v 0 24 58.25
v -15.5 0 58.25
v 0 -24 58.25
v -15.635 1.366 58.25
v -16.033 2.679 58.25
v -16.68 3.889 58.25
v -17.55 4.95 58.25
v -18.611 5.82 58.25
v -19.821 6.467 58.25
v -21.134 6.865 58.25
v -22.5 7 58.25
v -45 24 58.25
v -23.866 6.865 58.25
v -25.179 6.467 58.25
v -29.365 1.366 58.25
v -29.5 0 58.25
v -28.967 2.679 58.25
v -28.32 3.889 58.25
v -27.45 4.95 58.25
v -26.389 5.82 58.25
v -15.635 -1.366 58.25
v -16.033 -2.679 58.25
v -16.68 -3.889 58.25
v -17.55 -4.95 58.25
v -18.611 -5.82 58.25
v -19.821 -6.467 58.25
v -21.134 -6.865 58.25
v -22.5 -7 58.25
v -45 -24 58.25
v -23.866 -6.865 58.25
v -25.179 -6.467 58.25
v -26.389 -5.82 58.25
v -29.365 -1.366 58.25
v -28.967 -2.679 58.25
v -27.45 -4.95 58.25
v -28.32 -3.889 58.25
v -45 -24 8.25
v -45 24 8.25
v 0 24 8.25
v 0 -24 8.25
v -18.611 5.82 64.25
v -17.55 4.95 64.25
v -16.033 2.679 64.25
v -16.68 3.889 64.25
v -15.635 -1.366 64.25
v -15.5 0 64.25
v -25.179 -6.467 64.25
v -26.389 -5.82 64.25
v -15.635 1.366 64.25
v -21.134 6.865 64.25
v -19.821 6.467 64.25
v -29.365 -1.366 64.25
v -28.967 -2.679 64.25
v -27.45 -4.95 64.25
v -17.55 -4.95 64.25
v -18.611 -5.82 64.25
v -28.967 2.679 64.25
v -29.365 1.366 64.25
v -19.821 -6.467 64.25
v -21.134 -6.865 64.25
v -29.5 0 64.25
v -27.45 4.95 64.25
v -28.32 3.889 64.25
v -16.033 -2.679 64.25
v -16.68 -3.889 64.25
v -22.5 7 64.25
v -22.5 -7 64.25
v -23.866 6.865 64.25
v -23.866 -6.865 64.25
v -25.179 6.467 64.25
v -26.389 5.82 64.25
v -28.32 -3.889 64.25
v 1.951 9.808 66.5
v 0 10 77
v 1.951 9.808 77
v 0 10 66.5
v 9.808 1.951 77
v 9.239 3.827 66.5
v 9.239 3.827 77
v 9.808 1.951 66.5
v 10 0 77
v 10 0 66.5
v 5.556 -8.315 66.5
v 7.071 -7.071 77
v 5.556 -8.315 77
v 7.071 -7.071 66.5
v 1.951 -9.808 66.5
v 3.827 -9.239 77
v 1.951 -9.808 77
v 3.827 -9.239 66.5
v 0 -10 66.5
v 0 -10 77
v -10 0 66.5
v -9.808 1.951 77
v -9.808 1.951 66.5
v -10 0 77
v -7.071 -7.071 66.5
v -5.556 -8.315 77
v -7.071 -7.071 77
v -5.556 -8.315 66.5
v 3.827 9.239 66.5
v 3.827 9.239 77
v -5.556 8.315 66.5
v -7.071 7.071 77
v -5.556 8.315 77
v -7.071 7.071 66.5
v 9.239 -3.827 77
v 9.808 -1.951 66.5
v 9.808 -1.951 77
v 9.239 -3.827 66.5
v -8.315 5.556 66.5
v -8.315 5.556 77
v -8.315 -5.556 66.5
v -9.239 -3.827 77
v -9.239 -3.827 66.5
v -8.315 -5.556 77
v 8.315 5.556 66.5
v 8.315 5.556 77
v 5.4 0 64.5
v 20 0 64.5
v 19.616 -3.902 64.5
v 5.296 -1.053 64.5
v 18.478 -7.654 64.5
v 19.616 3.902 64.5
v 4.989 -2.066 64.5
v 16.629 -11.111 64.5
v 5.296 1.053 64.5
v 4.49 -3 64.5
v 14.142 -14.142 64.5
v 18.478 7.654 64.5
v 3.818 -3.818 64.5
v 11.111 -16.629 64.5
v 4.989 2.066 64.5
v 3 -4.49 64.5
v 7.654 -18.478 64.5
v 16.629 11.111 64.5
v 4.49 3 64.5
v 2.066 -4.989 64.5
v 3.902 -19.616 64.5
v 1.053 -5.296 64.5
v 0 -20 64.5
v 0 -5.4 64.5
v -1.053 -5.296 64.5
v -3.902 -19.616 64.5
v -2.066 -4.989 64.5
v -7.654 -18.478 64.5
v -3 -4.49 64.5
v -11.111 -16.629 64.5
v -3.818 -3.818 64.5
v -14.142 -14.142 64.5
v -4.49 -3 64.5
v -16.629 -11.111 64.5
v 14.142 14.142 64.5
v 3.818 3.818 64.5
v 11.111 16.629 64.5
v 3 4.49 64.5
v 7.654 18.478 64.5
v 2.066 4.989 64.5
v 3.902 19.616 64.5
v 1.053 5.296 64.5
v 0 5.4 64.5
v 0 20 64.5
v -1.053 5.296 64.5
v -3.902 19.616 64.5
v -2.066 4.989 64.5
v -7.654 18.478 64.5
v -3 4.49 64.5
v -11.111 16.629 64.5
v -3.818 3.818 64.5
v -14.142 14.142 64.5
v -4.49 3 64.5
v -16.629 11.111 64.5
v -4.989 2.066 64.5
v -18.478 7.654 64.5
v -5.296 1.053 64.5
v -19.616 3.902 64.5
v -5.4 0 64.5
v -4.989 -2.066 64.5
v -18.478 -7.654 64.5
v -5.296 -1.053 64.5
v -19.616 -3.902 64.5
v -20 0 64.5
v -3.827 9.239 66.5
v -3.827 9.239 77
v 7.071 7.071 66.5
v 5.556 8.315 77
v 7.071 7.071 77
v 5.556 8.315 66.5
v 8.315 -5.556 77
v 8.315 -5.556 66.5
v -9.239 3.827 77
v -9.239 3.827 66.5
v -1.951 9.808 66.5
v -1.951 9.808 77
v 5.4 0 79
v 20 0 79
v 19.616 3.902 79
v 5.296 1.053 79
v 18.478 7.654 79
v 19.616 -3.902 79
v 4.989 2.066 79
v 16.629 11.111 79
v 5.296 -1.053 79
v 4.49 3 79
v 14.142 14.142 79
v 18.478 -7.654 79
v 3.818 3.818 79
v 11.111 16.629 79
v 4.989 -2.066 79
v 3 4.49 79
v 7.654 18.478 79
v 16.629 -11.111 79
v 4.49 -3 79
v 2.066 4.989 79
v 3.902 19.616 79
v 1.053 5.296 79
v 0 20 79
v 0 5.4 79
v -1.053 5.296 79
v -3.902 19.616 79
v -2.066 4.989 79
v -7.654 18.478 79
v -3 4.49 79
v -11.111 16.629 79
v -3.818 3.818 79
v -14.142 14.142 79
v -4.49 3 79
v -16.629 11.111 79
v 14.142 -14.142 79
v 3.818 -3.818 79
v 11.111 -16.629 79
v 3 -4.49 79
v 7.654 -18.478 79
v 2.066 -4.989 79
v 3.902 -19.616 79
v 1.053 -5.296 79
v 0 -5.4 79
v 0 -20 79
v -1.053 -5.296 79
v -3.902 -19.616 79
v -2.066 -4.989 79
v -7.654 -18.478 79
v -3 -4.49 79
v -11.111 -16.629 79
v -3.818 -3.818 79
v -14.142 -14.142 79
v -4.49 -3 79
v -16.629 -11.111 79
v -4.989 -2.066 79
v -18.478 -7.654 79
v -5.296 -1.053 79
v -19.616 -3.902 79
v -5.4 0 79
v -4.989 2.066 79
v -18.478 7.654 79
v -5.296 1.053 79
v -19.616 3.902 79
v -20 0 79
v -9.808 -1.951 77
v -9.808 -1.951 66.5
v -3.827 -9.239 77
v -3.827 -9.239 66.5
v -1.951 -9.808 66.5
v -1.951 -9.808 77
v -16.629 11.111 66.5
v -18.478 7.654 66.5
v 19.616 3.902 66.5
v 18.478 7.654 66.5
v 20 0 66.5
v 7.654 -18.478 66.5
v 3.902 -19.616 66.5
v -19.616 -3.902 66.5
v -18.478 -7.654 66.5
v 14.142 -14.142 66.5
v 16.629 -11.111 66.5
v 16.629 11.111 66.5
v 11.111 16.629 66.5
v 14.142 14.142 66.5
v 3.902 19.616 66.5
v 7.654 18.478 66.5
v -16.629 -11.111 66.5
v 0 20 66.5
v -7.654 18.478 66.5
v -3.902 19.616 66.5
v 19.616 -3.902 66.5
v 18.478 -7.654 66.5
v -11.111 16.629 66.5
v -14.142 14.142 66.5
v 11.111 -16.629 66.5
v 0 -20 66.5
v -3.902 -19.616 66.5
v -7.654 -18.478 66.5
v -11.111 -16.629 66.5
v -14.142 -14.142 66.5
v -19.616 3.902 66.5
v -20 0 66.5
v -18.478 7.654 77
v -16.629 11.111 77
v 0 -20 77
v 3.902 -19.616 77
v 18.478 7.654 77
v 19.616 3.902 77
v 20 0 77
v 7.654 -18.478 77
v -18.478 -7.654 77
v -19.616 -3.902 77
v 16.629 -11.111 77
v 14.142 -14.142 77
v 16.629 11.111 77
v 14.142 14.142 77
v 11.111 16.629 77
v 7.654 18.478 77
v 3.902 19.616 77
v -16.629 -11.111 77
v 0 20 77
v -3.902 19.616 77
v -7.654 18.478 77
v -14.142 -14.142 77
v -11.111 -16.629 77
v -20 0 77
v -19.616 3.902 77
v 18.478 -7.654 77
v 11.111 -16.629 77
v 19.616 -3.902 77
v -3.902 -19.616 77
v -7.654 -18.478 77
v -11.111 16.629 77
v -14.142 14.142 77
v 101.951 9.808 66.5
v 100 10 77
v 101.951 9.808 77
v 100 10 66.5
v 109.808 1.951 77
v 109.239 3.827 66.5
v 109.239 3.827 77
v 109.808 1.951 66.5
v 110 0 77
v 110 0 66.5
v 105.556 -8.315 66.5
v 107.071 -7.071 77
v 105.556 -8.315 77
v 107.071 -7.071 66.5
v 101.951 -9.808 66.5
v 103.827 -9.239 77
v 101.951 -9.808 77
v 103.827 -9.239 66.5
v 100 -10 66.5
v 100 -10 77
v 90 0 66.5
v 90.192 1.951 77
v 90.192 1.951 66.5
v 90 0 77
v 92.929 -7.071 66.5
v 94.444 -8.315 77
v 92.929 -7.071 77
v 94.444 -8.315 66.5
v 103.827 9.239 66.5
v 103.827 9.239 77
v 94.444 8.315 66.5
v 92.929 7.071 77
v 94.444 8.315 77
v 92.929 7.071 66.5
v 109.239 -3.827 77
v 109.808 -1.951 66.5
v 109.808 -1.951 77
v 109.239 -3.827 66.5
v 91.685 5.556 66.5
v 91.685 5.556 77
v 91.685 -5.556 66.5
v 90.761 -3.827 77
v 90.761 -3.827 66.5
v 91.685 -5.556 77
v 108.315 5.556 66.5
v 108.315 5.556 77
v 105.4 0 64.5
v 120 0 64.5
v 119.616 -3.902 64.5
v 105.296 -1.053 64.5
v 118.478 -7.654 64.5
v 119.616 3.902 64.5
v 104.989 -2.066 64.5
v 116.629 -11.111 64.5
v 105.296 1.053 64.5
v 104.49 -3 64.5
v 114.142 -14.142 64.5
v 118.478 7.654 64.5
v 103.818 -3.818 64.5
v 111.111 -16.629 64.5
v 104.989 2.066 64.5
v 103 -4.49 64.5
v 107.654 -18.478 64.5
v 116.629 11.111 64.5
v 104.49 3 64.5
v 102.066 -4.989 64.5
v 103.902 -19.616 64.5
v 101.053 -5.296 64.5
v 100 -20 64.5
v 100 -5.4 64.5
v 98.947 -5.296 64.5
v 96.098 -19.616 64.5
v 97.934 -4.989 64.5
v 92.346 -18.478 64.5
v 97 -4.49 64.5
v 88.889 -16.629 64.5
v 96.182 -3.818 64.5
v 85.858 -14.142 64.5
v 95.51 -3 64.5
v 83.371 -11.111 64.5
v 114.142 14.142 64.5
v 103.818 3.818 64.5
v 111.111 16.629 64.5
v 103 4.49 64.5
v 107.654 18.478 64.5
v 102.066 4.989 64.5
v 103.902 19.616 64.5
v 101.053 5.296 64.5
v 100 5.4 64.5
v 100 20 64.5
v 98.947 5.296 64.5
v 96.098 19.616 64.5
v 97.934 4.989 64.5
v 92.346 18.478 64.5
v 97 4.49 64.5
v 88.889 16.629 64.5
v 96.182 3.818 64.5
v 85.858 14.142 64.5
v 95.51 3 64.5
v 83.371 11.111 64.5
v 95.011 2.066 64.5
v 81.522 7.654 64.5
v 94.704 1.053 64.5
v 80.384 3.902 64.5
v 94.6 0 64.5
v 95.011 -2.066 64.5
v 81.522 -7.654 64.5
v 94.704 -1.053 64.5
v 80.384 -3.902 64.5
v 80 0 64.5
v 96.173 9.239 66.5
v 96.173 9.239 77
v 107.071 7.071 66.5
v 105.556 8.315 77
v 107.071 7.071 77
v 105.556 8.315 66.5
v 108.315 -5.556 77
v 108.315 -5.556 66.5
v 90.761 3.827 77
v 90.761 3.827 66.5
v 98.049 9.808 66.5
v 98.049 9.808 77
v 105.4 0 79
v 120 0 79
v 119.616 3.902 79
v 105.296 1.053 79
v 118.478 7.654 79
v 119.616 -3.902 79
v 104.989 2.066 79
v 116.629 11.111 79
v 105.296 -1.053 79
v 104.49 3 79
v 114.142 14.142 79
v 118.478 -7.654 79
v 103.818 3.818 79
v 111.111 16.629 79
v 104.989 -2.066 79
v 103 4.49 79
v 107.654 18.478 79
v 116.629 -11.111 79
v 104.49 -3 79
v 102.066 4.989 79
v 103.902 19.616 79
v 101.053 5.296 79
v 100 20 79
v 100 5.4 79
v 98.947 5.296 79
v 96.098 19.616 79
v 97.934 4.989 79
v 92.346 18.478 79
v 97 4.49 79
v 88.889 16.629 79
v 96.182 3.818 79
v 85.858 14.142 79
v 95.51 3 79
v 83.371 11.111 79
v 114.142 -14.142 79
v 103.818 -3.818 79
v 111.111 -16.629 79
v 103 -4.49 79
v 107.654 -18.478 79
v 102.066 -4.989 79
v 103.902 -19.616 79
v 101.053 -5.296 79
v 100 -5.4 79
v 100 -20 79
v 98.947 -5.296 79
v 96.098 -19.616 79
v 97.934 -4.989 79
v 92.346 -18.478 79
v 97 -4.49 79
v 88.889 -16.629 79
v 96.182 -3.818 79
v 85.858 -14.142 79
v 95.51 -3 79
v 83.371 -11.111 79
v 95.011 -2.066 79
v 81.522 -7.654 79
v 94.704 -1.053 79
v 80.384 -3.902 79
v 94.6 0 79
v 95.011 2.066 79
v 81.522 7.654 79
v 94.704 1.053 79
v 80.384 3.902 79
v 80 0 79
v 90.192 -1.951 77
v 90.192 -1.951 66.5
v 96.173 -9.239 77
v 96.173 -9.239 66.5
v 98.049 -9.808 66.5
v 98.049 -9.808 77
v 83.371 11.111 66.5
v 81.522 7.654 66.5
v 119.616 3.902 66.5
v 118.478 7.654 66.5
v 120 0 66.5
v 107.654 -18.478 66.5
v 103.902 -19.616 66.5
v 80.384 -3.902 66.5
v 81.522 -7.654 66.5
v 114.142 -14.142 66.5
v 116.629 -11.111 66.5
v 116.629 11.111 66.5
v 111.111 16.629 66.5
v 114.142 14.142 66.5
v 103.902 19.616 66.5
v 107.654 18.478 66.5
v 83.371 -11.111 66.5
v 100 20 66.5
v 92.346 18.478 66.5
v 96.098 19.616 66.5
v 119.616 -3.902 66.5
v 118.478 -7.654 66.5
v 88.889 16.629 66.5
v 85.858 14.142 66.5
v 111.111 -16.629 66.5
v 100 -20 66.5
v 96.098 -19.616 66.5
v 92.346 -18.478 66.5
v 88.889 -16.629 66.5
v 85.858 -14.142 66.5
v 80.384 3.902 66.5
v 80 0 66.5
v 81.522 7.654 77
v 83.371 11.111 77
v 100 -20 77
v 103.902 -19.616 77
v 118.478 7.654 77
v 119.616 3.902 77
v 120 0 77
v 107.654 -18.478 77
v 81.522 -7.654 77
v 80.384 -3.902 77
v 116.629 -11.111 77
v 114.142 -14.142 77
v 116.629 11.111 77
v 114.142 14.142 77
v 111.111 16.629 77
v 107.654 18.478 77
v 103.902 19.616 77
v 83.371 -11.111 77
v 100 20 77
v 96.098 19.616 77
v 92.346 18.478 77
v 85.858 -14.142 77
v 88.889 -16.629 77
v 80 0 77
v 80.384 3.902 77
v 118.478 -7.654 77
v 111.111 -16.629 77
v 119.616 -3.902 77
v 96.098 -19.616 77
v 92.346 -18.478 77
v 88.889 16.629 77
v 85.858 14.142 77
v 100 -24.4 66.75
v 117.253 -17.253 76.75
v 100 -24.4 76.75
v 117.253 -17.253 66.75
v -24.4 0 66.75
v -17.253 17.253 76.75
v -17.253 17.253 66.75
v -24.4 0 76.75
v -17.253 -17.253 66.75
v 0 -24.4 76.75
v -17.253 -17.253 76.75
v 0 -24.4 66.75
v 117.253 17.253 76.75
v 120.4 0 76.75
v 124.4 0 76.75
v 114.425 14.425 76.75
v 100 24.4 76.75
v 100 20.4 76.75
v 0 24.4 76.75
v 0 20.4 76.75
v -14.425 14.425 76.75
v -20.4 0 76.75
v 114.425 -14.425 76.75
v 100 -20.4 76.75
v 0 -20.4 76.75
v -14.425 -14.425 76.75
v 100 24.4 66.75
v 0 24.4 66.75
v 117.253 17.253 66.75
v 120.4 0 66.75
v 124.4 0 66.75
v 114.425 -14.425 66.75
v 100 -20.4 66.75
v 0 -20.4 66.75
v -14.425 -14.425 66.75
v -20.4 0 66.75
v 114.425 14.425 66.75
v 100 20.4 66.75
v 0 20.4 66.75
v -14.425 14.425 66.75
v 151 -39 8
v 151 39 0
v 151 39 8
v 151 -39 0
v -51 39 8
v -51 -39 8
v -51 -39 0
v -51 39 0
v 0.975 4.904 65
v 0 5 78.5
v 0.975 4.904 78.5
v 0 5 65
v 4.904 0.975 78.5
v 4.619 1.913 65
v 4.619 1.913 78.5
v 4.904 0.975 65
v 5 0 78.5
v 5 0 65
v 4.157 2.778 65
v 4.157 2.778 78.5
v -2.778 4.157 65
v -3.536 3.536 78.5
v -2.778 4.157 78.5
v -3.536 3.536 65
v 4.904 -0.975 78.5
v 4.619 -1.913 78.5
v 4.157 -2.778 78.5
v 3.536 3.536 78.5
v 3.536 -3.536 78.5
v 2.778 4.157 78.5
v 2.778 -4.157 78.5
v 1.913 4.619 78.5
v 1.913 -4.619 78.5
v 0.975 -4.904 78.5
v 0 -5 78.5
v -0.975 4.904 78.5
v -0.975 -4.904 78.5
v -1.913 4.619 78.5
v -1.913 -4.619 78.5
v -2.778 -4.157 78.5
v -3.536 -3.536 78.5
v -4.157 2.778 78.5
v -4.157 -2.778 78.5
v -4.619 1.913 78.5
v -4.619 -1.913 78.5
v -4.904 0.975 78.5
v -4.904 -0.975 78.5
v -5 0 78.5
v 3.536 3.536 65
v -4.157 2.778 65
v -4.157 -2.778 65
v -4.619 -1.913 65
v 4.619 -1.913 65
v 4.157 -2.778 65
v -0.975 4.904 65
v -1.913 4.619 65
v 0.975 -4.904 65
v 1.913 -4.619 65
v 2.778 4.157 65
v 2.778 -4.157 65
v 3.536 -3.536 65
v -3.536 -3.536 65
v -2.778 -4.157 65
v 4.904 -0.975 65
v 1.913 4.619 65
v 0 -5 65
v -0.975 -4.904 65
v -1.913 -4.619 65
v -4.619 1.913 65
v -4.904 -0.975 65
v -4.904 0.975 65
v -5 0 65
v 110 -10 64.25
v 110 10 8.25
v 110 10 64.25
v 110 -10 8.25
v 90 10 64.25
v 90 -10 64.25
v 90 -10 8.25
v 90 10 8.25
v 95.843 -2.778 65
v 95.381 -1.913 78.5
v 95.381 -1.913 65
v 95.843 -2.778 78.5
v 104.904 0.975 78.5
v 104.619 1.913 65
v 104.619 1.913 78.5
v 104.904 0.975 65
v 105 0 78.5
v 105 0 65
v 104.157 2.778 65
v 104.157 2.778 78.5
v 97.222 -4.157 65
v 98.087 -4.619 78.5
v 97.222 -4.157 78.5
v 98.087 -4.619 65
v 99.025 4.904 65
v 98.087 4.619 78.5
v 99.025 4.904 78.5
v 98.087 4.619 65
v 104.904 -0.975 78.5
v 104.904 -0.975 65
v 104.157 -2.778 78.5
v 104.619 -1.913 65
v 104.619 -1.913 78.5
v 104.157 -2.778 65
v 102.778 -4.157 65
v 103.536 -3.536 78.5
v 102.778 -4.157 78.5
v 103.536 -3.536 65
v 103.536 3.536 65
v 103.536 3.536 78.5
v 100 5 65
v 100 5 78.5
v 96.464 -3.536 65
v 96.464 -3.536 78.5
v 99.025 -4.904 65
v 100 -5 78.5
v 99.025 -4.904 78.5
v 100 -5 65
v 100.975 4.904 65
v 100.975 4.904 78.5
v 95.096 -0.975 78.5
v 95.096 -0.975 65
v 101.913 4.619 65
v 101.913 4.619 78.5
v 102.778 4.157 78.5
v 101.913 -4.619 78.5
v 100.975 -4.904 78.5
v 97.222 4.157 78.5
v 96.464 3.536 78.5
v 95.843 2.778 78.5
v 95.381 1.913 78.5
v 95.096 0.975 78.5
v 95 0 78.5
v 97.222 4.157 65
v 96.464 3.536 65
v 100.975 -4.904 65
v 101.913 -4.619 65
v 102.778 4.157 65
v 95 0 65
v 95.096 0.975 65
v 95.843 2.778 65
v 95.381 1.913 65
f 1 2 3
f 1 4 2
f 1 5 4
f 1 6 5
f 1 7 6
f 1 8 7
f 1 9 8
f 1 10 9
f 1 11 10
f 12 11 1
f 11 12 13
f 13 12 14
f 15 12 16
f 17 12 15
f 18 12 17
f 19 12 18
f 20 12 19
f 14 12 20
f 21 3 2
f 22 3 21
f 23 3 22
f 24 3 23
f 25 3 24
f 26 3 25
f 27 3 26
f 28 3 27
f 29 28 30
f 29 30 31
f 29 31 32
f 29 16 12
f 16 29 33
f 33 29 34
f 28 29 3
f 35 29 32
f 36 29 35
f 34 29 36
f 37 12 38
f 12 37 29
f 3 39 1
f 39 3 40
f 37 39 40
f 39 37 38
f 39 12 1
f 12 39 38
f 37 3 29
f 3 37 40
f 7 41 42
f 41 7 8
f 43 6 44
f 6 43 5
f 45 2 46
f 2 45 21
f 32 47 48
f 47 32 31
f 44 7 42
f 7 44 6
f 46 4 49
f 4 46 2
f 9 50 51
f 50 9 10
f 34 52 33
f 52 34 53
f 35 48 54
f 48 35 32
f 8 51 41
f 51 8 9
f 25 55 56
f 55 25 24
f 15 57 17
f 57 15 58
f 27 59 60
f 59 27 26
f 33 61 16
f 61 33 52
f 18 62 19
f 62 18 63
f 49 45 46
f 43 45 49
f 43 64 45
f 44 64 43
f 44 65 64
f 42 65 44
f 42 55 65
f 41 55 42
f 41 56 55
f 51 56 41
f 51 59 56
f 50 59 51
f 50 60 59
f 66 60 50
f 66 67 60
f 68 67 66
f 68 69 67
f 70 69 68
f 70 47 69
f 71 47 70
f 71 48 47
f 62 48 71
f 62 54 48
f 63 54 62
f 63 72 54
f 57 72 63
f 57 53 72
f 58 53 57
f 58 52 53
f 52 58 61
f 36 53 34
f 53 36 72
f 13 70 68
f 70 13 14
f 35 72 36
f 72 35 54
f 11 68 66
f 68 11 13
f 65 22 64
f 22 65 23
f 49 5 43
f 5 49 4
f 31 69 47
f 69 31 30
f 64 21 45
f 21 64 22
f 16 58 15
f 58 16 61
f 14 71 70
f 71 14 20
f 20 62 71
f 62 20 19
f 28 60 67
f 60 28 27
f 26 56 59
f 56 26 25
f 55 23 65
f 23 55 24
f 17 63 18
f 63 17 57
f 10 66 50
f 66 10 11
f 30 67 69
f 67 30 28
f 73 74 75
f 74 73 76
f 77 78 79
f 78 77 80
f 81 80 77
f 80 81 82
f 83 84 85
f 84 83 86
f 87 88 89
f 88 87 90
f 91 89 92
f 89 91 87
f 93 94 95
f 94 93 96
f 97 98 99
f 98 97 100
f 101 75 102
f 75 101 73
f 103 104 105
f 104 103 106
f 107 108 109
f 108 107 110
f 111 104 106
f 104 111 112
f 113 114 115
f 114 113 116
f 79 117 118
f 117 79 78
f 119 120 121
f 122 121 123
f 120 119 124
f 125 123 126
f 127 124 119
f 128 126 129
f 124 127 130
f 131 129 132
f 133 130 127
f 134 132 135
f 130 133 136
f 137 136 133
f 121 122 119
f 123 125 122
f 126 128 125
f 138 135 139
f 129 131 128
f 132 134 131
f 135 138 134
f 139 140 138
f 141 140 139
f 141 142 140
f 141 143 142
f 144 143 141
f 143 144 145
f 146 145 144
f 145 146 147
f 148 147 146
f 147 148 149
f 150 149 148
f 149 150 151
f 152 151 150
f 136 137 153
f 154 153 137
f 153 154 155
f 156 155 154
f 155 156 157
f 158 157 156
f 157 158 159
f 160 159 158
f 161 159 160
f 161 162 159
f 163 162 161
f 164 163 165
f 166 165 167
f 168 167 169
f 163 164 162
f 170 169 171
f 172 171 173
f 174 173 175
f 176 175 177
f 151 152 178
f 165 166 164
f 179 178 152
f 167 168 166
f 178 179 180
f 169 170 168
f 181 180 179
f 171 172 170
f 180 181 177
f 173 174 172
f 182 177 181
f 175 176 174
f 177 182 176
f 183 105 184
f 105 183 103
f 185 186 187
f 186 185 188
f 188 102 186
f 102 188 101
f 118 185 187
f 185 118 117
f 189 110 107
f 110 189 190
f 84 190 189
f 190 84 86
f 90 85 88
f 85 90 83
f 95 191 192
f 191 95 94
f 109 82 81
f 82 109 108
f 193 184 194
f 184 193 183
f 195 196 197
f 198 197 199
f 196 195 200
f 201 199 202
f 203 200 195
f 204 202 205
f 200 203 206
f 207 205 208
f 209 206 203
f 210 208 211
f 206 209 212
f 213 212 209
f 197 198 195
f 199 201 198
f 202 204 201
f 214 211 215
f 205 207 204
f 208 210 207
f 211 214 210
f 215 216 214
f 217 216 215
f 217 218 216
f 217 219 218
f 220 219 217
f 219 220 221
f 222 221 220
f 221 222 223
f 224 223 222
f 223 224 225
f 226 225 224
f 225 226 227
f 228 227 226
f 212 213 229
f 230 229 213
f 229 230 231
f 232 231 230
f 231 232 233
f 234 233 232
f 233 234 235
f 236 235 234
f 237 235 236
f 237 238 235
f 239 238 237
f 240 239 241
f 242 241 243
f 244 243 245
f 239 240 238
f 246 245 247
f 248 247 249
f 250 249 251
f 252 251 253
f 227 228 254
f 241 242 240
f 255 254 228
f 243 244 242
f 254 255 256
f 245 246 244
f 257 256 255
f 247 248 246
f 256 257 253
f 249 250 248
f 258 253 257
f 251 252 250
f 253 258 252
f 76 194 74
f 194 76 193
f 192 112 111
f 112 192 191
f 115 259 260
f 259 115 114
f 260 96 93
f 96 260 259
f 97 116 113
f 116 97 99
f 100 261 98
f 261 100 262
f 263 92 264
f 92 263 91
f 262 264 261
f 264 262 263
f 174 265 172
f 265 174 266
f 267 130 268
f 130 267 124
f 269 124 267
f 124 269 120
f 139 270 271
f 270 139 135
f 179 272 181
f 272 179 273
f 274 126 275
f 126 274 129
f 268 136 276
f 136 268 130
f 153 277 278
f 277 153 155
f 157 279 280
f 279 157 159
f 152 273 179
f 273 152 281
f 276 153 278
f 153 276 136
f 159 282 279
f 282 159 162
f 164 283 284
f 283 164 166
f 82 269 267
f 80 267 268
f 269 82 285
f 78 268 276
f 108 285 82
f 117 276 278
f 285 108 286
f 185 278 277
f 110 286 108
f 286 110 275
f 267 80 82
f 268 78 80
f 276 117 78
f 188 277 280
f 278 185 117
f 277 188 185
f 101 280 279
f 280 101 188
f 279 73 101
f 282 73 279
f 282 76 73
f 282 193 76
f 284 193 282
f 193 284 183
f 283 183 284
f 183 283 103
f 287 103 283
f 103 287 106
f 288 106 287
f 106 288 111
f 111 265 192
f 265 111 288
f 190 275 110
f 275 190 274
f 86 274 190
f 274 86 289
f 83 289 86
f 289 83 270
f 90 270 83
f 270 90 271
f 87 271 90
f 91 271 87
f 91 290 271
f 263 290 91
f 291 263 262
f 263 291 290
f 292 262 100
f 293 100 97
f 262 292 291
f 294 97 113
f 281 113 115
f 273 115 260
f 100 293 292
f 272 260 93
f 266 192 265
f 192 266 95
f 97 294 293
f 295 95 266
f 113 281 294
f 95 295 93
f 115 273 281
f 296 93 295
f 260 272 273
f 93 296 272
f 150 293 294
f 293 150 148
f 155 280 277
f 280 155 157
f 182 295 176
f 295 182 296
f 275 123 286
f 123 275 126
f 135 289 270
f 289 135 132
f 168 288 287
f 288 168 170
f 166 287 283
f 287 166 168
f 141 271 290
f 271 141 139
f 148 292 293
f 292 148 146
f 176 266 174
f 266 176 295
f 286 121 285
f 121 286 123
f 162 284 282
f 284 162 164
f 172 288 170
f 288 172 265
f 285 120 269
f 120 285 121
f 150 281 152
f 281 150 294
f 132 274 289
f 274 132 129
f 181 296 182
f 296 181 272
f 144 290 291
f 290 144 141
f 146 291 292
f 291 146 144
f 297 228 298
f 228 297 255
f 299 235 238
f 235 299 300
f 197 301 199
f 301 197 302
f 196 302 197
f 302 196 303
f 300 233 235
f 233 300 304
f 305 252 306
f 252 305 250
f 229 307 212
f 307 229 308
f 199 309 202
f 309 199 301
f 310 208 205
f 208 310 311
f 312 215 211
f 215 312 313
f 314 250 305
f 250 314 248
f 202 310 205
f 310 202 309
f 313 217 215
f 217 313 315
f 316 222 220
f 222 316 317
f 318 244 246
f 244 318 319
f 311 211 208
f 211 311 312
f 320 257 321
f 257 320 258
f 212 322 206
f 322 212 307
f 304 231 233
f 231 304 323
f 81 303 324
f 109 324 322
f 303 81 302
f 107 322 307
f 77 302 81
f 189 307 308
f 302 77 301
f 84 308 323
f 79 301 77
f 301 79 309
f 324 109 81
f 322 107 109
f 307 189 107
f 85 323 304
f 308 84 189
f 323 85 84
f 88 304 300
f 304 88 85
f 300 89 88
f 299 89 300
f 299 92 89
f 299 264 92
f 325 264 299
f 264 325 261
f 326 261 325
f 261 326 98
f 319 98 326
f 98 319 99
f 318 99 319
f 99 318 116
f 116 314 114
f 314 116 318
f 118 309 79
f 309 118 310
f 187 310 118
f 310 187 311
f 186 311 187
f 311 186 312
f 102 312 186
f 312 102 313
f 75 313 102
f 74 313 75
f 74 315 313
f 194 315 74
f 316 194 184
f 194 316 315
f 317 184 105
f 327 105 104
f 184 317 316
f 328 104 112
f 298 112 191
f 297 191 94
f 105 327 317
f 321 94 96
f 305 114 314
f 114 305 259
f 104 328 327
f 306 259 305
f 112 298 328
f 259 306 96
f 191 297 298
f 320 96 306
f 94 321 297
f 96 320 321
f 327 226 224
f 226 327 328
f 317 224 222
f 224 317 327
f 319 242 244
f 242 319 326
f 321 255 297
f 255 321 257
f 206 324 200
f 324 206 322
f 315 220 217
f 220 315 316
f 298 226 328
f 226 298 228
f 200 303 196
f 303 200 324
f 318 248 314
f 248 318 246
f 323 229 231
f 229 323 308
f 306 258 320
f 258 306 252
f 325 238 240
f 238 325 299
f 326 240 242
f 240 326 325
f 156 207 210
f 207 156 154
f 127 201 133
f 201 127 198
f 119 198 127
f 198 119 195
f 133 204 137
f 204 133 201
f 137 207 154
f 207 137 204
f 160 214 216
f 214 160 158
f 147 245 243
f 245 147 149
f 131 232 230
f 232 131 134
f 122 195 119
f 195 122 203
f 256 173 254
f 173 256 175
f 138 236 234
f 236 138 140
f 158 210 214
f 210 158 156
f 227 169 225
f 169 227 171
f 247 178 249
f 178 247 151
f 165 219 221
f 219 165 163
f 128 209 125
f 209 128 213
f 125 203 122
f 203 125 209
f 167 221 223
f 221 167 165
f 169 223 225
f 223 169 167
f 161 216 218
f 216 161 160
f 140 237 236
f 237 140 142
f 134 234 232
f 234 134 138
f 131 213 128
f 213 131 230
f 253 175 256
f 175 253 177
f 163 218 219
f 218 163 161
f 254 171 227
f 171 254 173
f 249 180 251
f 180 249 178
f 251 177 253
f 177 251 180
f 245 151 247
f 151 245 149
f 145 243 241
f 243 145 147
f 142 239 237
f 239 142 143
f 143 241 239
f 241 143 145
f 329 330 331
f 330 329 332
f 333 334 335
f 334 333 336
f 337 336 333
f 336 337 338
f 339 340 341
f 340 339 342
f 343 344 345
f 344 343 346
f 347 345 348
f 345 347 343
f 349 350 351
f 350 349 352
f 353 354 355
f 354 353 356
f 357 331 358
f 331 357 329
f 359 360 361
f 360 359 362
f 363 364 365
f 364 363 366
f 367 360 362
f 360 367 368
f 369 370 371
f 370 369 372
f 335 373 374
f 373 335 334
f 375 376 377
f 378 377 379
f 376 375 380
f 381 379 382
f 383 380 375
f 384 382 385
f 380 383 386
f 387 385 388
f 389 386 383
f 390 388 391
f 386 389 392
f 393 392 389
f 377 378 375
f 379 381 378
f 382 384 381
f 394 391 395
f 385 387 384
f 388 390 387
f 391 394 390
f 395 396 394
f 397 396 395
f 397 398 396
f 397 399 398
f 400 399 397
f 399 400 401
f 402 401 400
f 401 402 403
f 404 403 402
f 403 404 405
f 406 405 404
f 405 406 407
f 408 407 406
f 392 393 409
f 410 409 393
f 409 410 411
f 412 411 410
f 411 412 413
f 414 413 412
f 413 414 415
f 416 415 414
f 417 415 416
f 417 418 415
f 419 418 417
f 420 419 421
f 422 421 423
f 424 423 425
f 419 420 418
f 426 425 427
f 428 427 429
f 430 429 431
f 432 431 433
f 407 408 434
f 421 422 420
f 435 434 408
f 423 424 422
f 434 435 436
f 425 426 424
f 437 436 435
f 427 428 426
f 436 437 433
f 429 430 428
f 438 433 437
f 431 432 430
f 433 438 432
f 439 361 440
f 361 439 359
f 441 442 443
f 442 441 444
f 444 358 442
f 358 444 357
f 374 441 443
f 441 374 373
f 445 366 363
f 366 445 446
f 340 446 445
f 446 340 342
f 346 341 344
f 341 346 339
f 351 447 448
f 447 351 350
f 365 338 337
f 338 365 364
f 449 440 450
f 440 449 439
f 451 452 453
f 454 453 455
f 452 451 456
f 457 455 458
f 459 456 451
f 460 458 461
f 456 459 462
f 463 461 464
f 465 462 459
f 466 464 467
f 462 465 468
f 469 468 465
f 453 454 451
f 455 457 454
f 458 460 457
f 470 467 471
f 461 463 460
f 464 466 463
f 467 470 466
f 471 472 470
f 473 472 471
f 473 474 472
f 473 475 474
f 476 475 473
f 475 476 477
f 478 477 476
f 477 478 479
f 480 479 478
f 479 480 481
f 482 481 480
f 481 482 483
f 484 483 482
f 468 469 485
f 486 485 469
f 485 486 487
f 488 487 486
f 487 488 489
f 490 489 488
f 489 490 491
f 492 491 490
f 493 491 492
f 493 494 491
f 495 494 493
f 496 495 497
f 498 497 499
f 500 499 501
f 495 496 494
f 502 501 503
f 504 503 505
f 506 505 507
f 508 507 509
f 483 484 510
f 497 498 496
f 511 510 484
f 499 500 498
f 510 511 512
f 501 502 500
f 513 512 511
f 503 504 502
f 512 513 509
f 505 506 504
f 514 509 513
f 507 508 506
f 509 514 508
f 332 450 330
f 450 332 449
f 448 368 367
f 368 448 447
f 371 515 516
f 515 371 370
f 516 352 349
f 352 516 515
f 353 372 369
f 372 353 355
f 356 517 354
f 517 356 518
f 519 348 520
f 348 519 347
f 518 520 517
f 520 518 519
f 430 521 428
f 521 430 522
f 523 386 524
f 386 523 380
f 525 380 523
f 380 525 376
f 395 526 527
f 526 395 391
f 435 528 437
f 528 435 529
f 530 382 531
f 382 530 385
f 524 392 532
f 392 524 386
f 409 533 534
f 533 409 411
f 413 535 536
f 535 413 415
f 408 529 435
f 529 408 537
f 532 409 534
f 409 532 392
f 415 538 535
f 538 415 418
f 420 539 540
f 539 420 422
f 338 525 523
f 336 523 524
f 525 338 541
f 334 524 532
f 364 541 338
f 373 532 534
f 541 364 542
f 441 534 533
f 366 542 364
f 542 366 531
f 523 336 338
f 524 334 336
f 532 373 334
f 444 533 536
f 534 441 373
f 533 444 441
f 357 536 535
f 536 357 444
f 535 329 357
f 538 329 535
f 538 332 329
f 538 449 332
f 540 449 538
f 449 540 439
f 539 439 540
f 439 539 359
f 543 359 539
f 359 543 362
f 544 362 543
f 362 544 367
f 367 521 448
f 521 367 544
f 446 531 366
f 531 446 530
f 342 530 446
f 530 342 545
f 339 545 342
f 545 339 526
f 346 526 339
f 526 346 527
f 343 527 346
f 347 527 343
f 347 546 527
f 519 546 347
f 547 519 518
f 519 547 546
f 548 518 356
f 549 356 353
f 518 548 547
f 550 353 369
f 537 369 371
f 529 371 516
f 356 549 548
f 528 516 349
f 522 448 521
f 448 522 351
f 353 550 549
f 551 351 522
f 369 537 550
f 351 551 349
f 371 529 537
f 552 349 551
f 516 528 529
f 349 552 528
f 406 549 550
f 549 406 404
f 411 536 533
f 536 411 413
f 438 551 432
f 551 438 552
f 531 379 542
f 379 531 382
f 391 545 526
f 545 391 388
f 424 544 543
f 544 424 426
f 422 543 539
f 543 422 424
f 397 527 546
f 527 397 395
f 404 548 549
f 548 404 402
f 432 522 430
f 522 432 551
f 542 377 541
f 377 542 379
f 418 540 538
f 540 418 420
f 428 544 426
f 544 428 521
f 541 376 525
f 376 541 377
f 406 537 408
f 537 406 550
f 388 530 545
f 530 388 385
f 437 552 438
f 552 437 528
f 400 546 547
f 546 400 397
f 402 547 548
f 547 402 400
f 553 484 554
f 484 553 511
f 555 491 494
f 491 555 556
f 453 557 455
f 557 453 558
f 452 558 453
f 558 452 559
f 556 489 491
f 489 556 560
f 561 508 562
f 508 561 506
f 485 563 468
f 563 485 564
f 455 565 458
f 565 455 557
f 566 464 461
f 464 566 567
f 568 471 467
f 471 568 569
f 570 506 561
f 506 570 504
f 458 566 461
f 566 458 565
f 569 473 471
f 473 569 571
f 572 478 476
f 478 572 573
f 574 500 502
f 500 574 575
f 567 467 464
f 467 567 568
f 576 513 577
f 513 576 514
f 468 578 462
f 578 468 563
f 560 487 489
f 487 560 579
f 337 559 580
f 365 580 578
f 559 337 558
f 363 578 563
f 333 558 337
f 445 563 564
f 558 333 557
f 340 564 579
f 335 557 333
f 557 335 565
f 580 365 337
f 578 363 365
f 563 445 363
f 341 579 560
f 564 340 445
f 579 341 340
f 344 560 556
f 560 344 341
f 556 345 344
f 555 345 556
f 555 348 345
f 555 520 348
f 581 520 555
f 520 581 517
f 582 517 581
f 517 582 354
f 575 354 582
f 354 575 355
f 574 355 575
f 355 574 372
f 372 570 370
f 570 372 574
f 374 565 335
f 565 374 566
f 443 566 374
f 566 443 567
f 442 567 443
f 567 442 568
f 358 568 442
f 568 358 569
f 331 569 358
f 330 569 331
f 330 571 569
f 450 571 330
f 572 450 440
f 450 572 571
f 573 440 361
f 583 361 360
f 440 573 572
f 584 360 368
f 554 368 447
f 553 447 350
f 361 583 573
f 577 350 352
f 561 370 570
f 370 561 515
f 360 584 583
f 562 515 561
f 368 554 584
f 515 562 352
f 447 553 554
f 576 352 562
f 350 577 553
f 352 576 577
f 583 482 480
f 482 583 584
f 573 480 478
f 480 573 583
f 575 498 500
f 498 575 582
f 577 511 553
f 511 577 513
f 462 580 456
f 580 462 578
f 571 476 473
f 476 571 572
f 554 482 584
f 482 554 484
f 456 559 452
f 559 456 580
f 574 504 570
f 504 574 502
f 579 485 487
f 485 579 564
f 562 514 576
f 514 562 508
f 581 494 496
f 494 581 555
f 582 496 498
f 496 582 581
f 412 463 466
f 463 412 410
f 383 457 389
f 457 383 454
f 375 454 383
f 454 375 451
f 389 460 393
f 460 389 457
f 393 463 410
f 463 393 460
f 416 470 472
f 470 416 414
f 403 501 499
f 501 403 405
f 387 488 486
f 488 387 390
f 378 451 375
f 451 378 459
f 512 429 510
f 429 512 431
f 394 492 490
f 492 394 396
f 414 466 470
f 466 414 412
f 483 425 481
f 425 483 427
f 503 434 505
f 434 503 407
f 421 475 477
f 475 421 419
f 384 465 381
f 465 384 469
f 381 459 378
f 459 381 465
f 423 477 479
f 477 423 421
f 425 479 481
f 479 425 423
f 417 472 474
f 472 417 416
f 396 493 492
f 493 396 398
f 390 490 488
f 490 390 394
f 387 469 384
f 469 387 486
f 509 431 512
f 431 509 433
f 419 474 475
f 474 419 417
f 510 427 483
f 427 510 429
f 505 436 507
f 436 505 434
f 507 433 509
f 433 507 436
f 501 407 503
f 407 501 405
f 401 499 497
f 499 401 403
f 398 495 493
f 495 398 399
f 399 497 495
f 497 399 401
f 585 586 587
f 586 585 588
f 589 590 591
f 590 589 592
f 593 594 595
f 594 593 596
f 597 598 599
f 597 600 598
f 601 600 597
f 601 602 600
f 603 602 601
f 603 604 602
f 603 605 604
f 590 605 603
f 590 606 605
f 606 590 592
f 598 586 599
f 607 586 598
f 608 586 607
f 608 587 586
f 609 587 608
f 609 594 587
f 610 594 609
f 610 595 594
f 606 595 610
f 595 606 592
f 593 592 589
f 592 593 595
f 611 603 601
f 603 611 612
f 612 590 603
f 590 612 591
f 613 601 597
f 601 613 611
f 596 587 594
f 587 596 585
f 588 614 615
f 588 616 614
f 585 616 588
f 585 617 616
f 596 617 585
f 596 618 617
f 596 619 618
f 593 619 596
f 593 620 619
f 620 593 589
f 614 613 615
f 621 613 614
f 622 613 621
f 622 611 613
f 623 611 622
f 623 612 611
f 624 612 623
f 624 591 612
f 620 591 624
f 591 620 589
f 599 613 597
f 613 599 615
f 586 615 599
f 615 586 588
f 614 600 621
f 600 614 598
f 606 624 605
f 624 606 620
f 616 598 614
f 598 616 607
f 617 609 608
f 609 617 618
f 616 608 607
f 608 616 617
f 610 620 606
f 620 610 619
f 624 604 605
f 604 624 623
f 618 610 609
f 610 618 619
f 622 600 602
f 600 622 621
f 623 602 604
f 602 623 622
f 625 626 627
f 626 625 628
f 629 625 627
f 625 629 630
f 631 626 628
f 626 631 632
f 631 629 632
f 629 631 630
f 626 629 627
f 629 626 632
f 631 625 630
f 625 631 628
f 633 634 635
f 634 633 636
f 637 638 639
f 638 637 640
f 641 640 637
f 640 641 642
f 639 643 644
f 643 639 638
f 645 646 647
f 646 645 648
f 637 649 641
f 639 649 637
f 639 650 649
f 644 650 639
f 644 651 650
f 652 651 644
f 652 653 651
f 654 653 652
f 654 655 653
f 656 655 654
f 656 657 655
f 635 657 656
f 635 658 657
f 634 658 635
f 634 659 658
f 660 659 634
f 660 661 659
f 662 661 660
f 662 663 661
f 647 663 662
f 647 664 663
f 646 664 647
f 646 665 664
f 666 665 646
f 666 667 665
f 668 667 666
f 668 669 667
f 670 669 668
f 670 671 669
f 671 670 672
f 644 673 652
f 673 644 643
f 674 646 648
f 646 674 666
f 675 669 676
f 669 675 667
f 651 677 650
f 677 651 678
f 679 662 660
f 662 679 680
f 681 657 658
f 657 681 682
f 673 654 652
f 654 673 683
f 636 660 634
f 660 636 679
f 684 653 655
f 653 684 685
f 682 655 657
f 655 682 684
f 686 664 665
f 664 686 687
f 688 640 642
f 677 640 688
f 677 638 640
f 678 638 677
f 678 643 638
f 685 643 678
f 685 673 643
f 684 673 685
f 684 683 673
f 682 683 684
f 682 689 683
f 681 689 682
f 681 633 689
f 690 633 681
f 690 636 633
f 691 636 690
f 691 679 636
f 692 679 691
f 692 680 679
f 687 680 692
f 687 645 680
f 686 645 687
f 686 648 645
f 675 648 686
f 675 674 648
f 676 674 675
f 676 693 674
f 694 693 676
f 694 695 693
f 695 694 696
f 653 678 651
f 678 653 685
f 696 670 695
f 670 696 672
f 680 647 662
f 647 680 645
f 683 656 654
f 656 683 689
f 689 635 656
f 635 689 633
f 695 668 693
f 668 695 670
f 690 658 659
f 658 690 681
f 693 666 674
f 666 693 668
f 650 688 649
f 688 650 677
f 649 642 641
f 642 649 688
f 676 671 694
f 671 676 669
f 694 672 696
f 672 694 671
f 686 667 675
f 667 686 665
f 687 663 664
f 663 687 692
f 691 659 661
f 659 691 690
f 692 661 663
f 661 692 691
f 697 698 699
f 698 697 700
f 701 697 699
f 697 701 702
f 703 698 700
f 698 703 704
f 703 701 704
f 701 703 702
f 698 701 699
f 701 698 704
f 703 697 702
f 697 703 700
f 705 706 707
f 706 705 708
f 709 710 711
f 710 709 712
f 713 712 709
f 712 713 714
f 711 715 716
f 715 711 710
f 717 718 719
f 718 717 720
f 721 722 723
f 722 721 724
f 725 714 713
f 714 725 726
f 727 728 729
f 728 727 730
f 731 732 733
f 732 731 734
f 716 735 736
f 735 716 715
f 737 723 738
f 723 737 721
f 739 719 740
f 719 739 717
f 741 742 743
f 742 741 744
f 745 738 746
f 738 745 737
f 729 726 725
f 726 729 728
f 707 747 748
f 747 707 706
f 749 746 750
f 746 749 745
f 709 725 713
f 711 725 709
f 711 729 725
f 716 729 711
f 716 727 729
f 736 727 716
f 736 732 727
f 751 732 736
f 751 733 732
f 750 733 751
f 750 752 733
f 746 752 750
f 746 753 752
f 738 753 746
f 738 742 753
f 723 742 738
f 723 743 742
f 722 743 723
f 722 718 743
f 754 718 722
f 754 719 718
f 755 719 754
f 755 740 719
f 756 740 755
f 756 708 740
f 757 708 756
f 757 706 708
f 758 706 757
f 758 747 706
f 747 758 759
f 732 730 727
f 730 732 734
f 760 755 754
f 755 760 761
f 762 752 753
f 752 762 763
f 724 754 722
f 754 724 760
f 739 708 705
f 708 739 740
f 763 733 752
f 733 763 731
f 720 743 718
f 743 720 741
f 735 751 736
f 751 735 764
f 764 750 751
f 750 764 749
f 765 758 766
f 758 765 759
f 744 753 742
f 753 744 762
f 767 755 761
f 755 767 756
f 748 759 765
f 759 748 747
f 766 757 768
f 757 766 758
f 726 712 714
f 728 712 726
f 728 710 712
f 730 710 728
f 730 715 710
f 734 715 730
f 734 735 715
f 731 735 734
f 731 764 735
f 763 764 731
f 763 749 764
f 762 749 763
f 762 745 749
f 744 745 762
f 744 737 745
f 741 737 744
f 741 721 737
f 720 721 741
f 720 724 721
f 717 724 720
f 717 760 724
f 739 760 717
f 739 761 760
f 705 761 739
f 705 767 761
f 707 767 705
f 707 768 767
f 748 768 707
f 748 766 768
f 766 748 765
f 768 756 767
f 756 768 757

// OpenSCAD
$fn = 32;

// ------------------------------------------------------------------------
// Motor belt drive: span 100 mm, pulleys d40, belt 10 mm wide
// Every part is its own module, assembly() places every instance.
// ------------------------------------------------------------------------

// --- part 1 ---
module base_plate() {
  difference() {
    translate([-101, -39, 0]) cube([202, 78, 8]);
  }
}

// --- part 2 ---
module motor() {
  union() {
    translate([-25, -24, 0]) cube([50, 48, 45]);
    translate([28, 0, 22.5]) rotate([0, 90, 0]) cylinder(h = 6, d = 14, center = true);
  }
}

// --- part 3 ---
module drive_shaft() {
  translate([0, 0, -6.75]) cylinder(h = 13.5, d = 10);
}

// --- part 4 ---
module pulley_drive() {
  difference() {
    union() {
      cylinder(h = 14.5, d = 20);
      cylinder(h = 2, d = 40);
      translate([0, 0, 12.5]) cylinder(h = 2, d = 40);
    }
    translate([0, 0, -1]) cylinder(h = 16.5, d = 10.8);
  }
}

// --- part 5 ---
module idler_post() {
  translate([-10, -10, 0]) cube([20, 20, 56]);
}

// --- part 6 ---
module driven_shaft() {
  translate([0, 0, -6.75]) cylinder(h = 13.5, d = 10);
}

// --- part 7 ---
module pulley_driven() {
  difference() {
    union() {
      cylinder(h = 14.5, d = 20);
      cylinder(h = 2, d = 40);
      translate([0, 0, 12.5]) cylinder(h = 2, d = 40);
    }
    translate([0, 0, -1]) cylinder(h = 16.5, d = 10.8);
  }
}

// --- part 8 ---
module drive_belt() {
  difference() {
    linear_extrude(height = 10) polygon(points = concat([for (a = [90 : 45 : 270]) [24.4 * cos(a), 24.4 * sin(a)]], [for (a = [270 : 45 : 450]) [100 + 24.4 * cos(a), 24.4 * sin(a)]]));
    translate([0, 0, -1]) linear_extrude(height = 12) polygon(points = concat([for (a = [90 : 45 : 270]) [20.4 * cos(a), 20.4 * sin(a)]], [for (a = [270 : 45 : 450]) [100 + 20.4 * cos(a), 20.4 * sin(a)]]));
  }
}

// --- assembly ---
module assembly() {
  color([0.80, 0.24, 0.20]) translate([50, 0, 0]) rotate([0, 0, 0]) base_plate();
  color([0.20, 0.45, 0.75]) translate([0, 0, 33.25]) rotate([0, 270, 0]) motor();
  color([0.25, 0.62, 0.32]) translate([0, 0, 71.75]) rotate([0, 0, 0]) drive_shaft();
  color([0.92, 0.70, 0.18]) translate([0, 0, 64.5]) rotate([0, 0, 0]) pulley_drive();
  color([0.58, 0.35, 0.70]) translate([100, 0, 8.25]) rotate([0, 0, 0]) idler_post();
  color([0.16, 0.66, 0.66]) translate([100, 0, 71.75]) rotate([0, 0, 0]) driven_shaft();
  color([0.85, 0.48, 0.18]) translate([100, 0, 64.5]) rotate([0, 0, 0]) pulley_driven();
  color([0.55, 0.60, 0.65]) translate([0, 0, 66.75]) rotate([0, 0, 0]) drive_belt();
}

assembly();
